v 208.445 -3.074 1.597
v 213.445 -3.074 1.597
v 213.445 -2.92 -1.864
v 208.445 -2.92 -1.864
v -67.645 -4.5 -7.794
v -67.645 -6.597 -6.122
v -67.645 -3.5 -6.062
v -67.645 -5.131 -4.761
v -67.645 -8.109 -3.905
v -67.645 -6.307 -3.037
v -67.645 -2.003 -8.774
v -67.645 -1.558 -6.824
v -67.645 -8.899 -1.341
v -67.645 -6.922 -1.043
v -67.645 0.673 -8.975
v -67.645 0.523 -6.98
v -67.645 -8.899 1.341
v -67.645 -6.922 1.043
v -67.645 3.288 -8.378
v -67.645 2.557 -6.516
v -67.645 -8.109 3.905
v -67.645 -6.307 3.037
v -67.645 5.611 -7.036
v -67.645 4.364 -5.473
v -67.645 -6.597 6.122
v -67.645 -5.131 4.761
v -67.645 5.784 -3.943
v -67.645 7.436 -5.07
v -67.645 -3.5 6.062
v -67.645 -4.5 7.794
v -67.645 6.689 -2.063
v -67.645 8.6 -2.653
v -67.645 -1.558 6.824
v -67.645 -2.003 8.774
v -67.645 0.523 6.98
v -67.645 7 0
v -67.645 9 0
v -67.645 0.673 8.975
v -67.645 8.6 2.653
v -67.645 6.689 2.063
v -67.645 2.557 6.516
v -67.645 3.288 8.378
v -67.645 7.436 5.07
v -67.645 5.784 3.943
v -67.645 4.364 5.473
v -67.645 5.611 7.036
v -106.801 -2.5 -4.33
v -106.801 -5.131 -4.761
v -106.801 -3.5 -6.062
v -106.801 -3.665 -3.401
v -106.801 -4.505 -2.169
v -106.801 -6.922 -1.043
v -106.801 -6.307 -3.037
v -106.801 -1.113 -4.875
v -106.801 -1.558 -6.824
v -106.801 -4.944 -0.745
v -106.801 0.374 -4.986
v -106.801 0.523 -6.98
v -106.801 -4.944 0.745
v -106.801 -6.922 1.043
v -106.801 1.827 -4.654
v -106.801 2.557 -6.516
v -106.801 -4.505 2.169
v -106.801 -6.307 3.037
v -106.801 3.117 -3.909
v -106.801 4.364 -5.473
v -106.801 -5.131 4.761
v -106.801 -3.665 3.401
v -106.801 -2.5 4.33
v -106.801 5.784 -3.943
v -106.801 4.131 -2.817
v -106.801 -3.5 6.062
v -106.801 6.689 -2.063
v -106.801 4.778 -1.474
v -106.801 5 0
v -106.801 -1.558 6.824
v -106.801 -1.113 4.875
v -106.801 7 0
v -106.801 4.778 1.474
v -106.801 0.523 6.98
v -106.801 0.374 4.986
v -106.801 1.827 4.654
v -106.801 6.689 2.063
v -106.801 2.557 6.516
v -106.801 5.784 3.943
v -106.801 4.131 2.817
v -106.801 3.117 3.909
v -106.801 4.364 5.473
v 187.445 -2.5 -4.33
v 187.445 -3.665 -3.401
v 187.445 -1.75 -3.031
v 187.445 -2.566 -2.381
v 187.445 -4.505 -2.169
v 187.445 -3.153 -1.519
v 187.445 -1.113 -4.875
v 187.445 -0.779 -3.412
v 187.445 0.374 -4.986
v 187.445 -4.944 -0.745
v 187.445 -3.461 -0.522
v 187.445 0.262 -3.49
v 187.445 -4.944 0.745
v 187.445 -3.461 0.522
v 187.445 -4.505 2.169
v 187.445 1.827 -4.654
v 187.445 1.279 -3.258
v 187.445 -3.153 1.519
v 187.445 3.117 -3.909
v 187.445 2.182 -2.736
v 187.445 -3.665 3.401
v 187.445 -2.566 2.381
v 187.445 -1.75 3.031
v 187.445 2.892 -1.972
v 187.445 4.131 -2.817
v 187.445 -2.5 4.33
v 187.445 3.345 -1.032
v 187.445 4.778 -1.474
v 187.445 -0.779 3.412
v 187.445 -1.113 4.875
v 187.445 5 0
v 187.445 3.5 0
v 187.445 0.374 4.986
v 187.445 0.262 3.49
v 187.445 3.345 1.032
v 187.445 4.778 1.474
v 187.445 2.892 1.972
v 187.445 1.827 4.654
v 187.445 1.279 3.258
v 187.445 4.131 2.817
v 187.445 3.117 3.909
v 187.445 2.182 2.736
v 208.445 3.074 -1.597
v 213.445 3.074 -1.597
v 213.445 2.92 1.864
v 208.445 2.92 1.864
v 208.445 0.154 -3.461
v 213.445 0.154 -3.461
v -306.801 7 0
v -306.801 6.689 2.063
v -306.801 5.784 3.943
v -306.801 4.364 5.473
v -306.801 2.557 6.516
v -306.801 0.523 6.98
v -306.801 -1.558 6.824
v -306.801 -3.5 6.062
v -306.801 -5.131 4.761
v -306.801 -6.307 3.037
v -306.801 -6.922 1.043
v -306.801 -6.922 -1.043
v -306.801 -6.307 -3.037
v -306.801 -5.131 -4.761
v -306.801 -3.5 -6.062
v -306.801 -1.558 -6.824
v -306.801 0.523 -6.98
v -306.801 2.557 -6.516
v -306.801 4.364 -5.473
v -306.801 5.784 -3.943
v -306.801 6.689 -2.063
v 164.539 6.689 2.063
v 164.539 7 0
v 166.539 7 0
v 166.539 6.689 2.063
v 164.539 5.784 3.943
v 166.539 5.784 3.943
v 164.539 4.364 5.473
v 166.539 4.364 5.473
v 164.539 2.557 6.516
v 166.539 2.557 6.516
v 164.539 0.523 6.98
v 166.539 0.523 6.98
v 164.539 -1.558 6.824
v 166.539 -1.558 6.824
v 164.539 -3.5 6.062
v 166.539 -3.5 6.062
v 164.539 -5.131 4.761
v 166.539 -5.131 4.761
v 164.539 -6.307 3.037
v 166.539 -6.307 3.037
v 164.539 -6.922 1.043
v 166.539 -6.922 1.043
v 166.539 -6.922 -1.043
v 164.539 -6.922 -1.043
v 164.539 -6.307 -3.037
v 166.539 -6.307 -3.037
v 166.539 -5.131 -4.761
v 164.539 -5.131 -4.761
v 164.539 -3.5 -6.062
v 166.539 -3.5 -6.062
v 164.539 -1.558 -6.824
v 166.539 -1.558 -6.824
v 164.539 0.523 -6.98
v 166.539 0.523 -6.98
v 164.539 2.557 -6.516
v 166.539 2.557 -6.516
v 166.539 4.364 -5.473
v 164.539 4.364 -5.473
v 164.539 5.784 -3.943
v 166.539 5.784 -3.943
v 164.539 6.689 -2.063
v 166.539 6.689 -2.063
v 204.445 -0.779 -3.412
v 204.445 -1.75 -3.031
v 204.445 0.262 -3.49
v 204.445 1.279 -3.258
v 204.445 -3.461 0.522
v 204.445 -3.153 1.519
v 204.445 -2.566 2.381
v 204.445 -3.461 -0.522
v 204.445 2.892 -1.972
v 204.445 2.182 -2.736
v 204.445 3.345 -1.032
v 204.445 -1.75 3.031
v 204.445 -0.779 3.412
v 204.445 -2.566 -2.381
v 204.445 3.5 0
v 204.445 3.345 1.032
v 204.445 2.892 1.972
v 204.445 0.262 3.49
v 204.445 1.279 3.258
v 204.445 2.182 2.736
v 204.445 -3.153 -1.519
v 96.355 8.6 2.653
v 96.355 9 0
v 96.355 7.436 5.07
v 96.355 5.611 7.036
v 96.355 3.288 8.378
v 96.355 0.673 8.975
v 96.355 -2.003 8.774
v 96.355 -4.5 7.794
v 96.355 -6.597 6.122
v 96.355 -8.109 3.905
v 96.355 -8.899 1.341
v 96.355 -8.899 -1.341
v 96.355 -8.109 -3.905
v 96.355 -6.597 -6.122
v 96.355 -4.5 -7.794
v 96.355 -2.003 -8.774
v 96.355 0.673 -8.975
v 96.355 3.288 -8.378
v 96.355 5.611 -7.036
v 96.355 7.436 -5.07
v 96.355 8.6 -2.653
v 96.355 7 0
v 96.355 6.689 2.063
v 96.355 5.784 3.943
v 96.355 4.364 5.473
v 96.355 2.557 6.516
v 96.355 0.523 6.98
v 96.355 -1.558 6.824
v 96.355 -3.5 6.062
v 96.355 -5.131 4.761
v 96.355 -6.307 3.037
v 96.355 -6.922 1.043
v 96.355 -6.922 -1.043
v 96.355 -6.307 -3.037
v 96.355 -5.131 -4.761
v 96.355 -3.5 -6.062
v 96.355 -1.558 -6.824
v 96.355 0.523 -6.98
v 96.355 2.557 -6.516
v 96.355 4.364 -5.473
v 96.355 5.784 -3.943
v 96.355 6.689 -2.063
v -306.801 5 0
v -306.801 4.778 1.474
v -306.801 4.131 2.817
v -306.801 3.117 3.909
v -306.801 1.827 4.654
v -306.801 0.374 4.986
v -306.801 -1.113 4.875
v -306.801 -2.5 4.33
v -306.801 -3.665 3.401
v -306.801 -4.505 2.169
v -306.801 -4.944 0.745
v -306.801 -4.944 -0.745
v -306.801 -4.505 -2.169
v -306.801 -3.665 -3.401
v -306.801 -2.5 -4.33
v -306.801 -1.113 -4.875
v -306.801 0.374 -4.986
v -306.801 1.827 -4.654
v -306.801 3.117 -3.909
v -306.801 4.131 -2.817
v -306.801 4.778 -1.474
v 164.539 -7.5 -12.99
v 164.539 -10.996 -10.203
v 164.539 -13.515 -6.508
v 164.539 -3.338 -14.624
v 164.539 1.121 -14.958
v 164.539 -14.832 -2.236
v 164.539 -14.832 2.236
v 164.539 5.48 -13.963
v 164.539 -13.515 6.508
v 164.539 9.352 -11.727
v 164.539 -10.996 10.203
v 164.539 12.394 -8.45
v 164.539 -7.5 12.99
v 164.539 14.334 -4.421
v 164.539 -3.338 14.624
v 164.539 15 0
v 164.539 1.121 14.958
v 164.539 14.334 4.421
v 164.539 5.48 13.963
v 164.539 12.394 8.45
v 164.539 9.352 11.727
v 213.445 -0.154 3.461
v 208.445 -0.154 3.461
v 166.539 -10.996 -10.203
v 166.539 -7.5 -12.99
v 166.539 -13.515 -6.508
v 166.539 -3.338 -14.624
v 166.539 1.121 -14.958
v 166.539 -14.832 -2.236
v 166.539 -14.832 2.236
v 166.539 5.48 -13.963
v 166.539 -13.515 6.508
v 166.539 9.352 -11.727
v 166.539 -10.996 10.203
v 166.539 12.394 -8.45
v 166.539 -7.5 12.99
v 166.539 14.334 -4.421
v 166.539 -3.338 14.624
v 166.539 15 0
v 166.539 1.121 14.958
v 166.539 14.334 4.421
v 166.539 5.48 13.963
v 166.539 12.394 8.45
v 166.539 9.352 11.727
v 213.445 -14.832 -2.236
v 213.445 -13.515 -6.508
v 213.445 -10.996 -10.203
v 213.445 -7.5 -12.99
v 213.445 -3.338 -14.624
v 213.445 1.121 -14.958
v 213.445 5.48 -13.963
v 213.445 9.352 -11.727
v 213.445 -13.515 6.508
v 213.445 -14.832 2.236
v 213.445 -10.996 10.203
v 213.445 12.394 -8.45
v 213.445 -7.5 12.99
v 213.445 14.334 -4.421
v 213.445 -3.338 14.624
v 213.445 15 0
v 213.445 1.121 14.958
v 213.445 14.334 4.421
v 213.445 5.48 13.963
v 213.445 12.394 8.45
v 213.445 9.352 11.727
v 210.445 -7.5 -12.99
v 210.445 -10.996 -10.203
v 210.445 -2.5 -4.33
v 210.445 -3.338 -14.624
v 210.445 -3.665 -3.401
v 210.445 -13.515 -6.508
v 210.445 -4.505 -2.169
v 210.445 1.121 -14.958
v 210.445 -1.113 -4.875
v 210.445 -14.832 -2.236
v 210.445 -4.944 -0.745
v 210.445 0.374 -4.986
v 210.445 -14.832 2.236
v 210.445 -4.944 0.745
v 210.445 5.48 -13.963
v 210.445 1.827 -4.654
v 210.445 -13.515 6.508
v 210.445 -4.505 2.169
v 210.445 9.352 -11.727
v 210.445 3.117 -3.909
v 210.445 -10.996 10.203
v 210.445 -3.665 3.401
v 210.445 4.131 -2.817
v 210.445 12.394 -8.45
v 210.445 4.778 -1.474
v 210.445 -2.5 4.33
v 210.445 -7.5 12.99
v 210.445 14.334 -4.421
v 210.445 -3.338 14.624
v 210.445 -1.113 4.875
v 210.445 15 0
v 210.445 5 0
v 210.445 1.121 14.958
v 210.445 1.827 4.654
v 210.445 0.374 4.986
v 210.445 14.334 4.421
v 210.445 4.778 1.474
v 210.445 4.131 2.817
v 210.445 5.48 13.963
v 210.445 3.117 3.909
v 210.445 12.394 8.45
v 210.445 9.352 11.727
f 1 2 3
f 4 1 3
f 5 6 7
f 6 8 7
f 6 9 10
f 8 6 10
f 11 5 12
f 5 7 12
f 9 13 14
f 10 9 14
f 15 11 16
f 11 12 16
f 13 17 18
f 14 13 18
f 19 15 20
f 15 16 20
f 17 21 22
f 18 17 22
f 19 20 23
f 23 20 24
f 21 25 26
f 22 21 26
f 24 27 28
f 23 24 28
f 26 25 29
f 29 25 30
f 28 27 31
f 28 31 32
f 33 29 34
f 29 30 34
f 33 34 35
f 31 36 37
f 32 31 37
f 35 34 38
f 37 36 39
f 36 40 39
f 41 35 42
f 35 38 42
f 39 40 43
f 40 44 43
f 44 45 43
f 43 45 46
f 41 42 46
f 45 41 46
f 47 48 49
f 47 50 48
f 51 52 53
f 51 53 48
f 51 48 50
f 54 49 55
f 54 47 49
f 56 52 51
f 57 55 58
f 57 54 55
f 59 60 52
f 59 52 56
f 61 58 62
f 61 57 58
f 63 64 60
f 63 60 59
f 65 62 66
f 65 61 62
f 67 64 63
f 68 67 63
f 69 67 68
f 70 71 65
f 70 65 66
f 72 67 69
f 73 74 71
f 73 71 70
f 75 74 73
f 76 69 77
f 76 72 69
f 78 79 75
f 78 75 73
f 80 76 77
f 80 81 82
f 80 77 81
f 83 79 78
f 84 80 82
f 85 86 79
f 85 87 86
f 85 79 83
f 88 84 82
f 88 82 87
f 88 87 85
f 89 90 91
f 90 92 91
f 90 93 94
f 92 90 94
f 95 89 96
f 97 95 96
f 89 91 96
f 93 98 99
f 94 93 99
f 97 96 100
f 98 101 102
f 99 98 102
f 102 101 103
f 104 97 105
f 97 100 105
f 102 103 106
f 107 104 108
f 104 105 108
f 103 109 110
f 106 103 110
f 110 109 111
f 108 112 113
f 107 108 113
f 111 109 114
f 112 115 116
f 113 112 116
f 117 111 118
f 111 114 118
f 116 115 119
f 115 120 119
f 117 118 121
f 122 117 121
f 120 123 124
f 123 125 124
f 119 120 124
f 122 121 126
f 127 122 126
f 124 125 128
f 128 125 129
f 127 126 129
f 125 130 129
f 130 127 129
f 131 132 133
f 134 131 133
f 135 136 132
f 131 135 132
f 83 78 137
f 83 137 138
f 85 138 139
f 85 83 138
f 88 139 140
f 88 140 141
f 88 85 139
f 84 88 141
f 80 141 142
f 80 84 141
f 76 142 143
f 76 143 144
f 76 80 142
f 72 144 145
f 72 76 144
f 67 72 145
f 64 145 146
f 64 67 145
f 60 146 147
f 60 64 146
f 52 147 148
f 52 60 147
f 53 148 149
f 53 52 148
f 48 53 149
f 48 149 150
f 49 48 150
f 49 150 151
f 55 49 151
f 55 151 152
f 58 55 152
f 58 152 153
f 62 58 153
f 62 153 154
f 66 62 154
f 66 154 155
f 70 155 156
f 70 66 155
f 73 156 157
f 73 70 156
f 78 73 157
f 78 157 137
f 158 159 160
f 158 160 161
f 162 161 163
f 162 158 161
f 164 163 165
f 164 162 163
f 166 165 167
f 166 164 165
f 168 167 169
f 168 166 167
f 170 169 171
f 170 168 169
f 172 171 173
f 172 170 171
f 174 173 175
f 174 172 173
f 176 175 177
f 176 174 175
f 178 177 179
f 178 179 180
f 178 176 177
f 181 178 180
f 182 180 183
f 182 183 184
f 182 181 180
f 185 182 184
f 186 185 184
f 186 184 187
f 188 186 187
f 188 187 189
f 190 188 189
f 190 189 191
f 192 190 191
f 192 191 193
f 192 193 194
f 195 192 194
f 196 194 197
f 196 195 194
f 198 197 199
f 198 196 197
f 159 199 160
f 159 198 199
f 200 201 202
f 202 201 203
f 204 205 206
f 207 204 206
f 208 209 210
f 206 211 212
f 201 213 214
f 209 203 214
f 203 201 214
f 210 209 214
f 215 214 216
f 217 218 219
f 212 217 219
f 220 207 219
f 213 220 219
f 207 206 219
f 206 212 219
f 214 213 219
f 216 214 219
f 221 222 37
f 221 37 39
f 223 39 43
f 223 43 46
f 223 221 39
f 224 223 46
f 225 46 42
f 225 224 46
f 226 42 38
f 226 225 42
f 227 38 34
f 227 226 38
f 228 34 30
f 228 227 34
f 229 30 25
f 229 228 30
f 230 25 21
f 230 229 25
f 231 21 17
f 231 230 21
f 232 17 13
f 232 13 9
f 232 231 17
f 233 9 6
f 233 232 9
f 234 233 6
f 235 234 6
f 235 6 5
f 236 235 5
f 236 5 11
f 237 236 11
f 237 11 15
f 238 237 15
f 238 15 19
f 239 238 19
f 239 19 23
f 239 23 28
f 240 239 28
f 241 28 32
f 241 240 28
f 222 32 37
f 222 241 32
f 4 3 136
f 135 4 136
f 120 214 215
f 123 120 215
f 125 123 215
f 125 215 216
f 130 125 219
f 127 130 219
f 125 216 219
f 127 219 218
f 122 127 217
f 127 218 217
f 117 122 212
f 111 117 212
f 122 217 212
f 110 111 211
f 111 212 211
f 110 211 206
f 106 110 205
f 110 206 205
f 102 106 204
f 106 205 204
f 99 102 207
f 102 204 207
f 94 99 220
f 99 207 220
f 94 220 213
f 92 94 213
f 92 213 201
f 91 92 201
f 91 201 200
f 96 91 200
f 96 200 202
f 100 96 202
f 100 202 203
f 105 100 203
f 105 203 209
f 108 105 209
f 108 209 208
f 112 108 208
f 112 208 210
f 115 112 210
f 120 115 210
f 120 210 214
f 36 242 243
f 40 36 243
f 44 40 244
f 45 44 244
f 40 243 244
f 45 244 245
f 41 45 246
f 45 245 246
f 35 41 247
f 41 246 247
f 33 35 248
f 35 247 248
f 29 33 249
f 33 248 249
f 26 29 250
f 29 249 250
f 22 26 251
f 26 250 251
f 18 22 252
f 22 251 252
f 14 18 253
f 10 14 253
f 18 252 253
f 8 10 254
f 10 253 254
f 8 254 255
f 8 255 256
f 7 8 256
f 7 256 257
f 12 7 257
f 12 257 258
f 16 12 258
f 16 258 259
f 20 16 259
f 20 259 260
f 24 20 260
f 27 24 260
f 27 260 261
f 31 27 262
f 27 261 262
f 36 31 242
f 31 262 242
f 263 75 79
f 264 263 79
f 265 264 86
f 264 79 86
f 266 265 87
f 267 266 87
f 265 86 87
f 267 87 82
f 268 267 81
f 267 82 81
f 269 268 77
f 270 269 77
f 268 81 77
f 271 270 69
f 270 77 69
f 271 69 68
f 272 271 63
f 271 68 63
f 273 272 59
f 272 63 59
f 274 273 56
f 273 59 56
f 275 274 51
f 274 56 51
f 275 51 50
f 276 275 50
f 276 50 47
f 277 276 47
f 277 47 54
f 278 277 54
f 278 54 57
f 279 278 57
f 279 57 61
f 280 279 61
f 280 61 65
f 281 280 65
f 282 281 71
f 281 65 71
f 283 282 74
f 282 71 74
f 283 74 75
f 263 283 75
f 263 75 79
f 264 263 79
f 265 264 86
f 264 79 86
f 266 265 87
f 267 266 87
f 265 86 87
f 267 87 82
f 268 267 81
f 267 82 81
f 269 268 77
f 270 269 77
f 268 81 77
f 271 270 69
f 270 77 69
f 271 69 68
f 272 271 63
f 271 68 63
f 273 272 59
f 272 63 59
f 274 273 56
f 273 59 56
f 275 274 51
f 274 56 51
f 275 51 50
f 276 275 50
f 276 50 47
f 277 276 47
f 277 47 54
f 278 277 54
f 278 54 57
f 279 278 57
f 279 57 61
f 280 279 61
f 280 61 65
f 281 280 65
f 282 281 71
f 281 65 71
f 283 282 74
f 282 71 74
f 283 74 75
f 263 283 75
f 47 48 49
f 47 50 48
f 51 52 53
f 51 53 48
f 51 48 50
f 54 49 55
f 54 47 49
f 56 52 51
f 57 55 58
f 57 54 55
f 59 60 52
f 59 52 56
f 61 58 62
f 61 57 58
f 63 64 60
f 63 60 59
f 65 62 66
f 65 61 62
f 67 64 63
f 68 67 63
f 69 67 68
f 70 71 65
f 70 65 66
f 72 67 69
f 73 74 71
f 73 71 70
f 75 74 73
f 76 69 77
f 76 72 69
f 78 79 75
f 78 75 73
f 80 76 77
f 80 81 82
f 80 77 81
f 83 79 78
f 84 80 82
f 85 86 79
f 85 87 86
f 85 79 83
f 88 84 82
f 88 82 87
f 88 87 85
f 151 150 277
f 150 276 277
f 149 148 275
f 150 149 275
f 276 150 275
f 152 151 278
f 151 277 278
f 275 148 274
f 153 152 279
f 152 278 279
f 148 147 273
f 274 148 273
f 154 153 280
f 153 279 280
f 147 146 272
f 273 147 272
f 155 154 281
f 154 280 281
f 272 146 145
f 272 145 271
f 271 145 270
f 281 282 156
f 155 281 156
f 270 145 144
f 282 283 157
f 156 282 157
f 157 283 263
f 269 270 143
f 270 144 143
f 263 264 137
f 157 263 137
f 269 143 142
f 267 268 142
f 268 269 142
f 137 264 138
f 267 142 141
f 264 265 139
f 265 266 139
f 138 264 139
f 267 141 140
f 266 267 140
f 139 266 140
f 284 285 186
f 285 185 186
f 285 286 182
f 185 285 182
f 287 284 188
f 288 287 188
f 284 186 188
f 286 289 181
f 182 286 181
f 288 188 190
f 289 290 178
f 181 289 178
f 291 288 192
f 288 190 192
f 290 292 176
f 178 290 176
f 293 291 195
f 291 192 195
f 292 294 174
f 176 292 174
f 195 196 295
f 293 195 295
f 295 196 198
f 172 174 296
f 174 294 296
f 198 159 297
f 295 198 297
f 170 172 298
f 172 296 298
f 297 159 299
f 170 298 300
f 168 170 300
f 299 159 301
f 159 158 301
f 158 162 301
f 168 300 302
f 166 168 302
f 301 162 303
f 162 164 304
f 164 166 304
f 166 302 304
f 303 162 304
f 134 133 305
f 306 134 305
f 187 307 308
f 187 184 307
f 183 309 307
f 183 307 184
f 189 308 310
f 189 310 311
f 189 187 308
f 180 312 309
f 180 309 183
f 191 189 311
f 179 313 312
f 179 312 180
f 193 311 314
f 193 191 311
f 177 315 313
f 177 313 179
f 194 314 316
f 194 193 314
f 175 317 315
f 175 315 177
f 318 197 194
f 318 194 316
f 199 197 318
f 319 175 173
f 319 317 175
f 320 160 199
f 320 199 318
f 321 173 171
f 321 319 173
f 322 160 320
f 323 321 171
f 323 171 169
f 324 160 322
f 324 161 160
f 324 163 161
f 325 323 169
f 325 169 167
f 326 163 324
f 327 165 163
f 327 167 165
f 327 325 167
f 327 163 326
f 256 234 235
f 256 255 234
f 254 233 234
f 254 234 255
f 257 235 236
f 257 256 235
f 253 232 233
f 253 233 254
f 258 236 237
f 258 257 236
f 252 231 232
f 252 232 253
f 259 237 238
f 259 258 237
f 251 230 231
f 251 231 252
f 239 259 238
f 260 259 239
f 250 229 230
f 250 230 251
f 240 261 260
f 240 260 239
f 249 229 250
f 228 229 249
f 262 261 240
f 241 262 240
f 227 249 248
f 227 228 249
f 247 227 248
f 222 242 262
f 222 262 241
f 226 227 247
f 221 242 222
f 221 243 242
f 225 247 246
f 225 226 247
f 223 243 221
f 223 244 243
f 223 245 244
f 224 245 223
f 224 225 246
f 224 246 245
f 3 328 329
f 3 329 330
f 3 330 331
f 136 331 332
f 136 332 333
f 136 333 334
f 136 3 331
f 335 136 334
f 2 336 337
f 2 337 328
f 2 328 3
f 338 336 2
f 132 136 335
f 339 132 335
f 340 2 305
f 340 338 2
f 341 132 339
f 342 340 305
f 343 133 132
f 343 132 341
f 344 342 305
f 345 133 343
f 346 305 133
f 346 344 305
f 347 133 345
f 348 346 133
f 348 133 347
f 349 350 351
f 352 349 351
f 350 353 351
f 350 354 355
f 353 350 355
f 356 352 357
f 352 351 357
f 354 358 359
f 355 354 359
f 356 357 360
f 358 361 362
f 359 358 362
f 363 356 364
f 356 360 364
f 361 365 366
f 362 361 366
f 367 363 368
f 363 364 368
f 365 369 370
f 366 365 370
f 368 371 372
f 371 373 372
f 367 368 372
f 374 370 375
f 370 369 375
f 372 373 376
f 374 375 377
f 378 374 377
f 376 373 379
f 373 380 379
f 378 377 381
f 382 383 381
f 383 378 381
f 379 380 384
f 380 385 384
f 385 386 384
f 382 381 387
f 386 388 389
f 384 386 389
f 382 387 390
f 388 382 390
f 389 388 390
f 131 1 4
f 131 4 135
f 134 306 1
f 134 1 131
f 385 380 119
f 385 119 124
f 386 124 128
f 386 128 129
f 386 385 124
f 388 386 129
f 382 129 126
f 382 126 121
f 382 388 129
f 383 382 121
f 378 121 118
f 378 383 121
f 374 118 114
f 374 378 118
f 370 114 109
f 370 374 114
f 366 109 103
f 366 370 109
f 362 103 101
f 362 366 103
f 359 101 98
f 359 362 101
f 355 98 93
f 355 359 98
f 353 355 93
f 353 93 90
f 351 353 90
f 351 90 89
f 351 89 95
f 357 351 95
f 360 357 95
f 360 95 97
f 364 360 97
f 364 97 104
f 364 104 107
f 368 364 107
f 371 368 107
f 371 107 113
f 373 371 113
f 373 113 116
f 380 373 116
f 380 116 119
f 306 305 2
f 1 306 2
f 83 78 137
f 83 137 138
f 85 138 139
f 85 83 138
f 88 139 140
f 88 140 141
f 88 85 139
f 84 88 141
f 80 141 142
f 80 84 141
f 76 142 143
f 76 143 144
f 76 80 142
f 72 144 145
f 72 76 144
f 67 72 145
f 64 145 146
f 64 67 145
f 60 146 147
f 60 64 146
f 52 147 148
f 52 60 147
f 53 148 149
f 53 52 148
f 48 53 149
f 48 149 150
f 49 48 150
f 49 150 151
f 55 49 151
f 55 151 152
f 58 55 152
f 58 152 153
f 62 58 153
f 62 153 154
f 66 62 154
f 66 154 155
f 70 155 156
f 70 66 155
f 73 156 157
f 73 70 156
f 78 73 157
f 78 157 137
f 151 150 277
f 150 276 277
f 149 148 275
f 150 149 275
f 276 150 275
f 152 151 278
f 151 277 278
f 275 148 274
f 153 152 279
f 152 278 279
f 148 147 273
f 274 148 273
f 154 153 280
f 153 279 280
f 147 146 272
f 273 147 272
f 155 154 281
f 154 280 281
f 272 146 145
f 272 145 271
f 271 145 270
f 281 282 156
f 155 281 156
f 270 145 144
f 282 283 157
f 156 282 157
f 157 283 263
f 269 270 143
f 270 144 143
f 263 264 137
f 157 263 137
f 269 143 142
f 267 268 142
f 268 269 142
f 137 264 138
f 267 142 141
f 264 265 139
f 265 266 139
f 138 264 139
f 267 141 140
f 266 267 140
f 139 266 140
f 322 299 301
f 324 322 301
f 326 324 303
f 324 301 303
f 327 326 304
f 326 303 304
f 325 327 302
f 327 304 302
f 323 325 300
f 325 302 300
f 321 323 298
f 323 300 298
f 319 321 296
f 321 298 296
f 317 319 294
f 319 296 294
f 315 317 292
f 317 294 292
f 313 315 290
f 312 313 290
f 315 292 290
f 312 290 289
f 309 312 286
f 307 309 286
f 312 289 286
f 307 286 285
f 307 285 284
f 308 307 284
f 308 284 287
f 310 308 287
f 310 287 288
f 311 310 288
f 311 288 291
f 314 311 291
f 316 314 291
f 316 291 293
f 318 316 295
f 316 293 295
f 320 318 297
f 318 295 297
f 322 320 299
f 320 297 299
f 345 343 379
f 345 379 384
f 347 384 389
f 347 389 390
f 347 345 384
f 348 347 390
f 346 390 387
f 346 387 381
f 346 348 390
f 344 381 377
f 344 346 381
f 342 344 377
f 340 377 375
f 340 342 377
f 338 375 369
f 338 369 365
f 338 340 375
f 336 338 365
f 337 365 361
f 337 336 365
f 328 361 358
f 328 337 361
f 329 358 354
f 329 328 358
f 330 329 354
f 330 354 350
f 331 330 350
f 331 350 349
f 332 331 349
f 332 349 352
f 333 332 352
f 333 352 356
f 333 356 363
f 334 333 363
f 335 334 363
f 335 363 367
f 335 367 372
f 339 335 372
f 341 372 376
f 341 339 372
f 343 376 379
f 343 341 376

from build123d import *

# Parameters (mm, degrees)
F2_R      = 7
F2_R_2    = 5
F3_DEPTH  = 200
F9_DEPTH  = 200
F7_R      = 9
F7_R_2    = 7
F10_DEPTH = 164
F8_R      = 5
F8_R_2    = 3.5
F11_DEPTH = 26
F8_R_3    = 15
F12_DEPTH = 3
F13_DEPTH = 9
F14_DEPTH = 5
F15_R     = 15
F15_R_2   = 7
F16_DEPTH = 2


with BuildPart() as f3:
    # F2 (on plane+point) → F3 (new body, through all)
    with BuildSketch(Plane.YZ.offset(-106.8006694317)):
        Circle(F2_R)
        Circle(F2_R_2, mode=Mode.SUBTRACT)
    extrude(amount=-F3_DEPTH)


with BuildPart() as f9:
    # F2 (on plane+point) → F9 (new body, through all)
    with BuildSketch(Plane.YZ.offset(-106.8006694317)):
        Circle(F2_R)
        Circle(F2_R_2, mode=Mode.SUBTRACT)
    extrude(amount=-F9_DEPTH)


with BuildPart() as f10:
    # F7 (on plane+point) → F10 (new body, through all)
    with BuildSketch(Plane.YZ.offset(96.3545098305)):
        Circle(F7_R)
        Circle(F7_R_2, mode=Mode.SUBTRACT)
    extrude(amount=-F10_DEPTH)


with BuildPart() as f11:
    # F8 (on plane+point) → F11 (new body)
    with BuildSketch(Plane.YZ.offset(213.4446501732)):
        Circle(F8_R)
        Circle(F8_R_2, mode=Mode.SUBTRACT)
    extrude(amount=-F11_DEPTH)

    # F8 (on plane+point) → F12 (join)
    with BuildSketch(Plane.YZ.offset(213.4446501732)):
        Circle(F8_R_3)
        Circle(F8_R, mode=Mode.SUBTRACT)
    extrude(amount=-F12_DEPTH)

    # F8 (on plane+point) → F13 (join)
    with BuildSketch(Plane.YZ.offset(213.4446501732)):
        Circle(F8_R_2)
        Polygon((2.9198812688, 1.8639456473), (3.0741649162, -1.5967185312), (0.1542836474, -3.4606641785), (-2.9198812688, -1.8639456473), (-3.0741649162, 1.5967185312), (-0.1542836474, 3.4606641785), align=None, mode=Mode.SUBTRACT)
        Polygon((0.1542836474, -3.4606641785), (3.0741649162, -1.5967185312), (2.9198812688, 1.8639456473), (-0.1542836474, 3.4606641785), (-3.0741649162, 1.5967185312), (-2.9198812688, -1.8639456473), align=None)
    extrude(amount=-F13_DEPTH)

    # F8 (on plane+point) → F14 (cut)
    with BuildSketch(Plane.YZ.offset(213.4446501732)):
        Polygon((0.1542836474, -3.4606641785), (3.0741649162, -1.5967185312), (2.9198812688, 1.8639456473), (-0.1542836474, 3.4606641785), (-3.0741649162, 1.5967185312), (-2.9198812688, -1.8639456473), align=None)
    extrude(amount=-F14_DEPTH, mode=Mode.SUBTRACT)


with BuildPart() as f16:
    # F15 (on plane+point) → F16 (new body)
    with BuildSketch(Plane.YZ.offset(164.5385622978)):
        Circle(F15_R)
        Circle(F15_R_2, mode=Mode.SUBTRACT)
    extrude(amount=F16_DEPTH)


solid = Compound([f3.part, f9.part, f10.part, f11.part, f16.part])
